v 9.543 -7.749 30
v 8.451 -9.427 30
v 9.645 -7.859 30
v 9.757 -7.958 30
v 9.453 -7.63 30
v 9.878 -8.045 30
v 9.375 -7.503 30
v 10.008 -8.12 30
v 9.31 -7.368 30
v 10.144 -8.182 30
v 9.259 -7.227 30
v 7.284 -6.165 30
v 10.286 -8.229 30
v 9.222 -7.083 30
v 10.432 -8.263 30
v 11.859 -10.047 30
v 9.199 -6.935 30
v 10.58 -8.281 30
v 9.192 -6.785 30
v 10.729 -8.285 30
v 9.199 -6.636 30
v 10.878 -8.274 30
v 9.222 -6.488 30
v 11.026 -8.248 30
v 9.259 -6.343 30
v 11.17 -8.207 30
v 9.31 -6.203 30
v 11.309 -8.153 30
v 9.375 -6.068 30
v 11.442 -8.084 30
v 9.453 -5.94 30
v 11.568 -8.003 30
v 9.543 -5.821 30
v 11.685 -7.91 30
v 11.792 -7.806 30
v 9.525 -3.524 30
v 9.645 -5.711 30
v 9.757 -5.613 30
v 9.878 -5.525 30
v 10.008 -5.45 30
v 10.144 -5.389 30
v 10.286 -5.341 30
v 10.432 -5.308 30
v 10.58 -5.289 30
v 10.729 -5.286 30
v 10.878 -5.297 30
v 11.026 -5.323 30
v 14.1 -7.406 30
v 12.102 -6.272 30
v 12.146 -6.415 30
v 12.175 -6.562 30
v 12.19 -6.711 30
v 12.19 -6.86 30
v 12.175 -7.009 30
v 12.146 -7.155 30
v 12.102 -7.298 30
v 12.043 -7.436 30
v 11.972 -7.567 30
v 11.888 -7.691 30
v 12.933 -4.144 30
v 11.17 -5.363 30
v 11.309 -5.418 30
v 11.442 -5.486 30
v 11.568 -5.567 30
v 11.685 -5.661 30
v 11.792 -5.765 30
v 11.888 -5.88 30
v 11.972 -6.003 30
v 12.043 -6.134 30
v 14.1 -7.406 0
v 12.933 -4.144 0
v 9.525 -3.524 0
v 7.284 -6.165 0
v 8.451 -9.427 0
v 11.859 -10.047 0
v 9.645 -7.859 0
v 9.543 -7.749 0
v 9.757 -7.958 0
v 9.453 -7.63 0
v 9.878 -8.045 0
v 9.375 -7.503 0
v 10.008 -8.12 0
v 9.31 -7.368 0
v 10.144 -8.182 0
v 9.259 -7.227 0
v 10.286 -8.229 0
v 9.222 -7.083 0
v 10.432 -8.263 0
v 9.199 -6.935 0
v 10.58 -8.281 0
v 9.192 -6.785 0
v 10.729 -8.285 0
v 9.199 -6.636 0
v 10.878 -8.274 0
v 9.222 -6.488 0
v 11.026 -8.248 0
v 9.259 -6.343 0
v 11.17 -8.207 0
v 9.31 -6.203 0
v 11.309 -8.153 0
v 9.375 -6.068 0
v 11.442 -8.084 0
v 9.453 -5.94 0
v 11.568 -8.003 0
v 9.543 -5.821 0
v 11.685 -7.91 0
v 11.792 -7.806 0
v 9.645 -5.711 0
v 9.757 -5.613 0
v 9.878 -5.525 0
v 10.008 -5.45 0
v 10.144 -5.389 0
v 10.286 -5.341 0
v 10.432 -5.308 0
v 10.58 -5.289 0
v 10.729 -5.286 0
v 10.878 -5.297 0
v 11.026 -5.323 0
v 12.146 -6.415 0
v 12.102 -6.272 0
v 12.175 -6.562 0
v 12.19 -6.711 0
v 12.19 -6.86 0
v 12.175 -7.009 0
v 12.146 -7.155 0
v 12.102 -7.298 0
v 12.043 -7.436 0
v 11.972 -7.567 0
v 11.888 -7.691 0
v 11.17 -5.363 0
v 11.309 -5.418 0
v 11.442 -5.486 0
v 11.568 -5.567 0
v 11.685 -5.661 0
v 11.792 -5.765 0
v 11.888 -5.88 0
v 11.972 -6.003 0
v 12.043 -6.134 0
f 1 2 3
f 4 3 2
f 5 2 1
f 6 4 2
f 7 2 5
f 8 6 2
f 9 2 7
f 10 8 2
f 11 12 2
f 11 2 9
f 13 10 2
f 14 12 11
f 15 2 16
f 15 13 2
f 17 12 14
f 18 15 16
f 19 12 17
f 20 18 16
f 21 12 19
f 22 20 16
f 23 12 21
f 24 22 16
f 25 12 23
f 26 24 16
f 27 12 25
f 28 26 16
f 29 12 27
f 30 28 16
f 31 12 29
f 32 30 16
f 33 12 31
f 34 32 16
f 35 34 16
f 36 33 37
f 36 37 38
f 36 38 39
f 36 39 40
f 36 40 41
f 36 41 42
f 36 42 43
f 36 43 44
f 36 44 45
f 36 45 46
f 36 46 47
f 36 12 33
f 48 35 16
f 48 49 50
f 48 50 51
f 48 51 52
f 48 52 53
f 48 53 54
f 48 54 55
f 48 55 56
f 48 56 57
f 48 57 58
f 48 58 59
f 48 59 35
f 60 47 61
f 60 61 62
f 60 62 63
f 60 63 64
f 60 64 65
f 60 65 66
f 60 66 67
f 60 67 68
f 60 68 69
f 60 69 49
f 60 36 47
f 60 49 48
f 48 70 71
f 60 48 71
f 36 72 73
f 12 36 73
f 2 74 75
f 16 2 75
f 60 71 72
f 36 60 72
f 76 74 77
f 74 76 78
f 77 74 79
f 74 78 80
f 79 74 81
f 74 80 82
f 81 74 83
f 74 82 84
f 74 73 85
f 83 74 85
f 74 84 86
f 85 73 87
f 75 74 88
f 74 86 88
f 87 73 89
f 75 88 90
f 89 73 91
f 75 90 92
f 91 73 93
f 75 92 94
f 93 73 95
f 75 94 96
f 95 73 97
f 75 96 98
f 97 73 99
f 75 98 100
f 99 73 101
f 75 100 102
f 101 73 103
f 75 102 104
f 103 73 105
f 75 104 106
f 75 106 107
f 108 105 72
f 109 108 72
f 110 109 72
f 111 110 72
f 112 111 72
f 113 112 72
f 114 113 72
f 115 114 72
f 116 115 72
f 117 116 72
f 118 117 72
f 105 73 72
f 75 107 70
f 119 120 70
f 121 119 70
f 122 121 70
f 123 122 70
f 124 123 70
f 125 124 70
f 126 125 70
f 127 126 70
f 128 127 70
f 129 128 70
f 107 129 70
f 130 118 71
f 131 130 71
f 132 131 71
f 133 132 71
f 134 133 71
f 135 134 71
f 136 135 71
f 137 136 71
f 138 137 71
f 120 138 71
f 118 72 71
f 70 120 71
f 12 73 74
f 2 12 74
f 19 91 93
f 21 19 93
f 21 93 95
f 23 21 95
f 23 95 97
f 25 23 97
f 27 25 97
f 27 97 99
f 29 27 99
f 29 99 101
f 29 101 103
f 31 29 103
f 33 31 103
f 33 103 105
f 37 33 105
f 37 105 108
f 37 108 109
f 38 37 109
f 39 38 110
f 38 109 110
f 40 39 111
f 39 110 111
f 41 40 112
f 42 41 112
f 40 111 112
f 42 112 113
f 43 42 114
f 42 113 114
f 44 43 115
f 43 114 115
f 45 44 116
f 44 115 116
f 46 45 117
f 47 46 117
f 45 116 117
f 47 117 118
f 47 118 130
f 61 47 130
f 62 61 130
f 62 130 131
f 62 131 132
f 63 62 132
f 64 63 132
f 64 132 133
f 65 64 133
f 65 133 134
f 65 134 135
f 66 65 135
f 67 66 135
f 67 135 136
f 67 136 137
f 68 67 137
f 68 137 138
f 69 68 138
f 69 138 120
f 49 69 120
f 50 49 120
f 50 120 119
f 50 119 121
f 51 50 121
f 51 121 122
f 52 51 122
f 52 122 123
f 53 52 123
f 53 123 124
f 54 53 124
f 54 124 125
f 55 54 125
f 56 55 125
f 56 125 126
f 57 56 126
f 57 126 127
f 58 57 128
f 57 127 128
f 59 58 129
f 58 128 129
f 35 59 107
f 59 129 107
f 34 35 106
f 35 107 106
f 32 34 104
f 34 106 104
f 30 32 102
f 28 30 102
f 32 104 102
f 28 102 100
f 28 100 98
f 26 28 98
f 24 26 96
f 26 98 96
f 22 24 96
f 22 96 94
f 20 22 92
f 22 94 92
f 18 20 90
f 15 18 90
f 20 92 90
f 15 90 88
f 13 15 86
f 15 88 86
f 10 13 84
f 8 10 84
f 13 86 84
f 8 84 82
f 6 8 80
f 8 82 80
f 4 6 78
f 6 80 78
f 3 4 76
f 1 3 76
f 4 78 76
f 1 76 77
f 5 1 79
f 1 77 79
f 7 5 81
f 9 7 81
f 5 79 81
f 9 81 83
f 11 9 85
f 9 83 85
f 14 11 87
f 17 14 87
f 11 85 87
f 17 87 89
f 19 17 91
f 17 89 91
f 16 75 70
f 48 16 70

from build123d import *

# Parameters (mm, degrees)
RESSALTO_EXTRUS_O1_DEPTH = 30
ESBO_O4_R                = 1.5
CORTE_EXTRUS_O2_DEPTH    = 40


with BuildPart() as part:
    # Esboço1 → Ressalto-extrusão1 (new body)
    with BuildSketch(Plane.XY):
        Polygon((12.933175524, -4.143885809), (9.525050306, -3.523658029), (7.283854683, -6.165067156), (8.450784277, -9.426704064), (11.858909495, -10.046931845), (14.100105118, -7.405522718), align=None)
    extrude(amount=RESSALTO_EXTRUS_O1_DEPTH)

    # Esboço4 → Corte-extrusão2 (cut)
    with BuildSketch(Plane(origin=(0, 0, 0), x_dir=(-1, 0, 0), z_dir=(0, 0, -1))):
        with Locations((-10.691979901, -6.785294937)):
            Circle(ESBO_O4_R)
    extrude(amount=-CORTE_EXTRUS_O2_DEPTH, mode=Mode.SUBTRACT)


solid = part.part
